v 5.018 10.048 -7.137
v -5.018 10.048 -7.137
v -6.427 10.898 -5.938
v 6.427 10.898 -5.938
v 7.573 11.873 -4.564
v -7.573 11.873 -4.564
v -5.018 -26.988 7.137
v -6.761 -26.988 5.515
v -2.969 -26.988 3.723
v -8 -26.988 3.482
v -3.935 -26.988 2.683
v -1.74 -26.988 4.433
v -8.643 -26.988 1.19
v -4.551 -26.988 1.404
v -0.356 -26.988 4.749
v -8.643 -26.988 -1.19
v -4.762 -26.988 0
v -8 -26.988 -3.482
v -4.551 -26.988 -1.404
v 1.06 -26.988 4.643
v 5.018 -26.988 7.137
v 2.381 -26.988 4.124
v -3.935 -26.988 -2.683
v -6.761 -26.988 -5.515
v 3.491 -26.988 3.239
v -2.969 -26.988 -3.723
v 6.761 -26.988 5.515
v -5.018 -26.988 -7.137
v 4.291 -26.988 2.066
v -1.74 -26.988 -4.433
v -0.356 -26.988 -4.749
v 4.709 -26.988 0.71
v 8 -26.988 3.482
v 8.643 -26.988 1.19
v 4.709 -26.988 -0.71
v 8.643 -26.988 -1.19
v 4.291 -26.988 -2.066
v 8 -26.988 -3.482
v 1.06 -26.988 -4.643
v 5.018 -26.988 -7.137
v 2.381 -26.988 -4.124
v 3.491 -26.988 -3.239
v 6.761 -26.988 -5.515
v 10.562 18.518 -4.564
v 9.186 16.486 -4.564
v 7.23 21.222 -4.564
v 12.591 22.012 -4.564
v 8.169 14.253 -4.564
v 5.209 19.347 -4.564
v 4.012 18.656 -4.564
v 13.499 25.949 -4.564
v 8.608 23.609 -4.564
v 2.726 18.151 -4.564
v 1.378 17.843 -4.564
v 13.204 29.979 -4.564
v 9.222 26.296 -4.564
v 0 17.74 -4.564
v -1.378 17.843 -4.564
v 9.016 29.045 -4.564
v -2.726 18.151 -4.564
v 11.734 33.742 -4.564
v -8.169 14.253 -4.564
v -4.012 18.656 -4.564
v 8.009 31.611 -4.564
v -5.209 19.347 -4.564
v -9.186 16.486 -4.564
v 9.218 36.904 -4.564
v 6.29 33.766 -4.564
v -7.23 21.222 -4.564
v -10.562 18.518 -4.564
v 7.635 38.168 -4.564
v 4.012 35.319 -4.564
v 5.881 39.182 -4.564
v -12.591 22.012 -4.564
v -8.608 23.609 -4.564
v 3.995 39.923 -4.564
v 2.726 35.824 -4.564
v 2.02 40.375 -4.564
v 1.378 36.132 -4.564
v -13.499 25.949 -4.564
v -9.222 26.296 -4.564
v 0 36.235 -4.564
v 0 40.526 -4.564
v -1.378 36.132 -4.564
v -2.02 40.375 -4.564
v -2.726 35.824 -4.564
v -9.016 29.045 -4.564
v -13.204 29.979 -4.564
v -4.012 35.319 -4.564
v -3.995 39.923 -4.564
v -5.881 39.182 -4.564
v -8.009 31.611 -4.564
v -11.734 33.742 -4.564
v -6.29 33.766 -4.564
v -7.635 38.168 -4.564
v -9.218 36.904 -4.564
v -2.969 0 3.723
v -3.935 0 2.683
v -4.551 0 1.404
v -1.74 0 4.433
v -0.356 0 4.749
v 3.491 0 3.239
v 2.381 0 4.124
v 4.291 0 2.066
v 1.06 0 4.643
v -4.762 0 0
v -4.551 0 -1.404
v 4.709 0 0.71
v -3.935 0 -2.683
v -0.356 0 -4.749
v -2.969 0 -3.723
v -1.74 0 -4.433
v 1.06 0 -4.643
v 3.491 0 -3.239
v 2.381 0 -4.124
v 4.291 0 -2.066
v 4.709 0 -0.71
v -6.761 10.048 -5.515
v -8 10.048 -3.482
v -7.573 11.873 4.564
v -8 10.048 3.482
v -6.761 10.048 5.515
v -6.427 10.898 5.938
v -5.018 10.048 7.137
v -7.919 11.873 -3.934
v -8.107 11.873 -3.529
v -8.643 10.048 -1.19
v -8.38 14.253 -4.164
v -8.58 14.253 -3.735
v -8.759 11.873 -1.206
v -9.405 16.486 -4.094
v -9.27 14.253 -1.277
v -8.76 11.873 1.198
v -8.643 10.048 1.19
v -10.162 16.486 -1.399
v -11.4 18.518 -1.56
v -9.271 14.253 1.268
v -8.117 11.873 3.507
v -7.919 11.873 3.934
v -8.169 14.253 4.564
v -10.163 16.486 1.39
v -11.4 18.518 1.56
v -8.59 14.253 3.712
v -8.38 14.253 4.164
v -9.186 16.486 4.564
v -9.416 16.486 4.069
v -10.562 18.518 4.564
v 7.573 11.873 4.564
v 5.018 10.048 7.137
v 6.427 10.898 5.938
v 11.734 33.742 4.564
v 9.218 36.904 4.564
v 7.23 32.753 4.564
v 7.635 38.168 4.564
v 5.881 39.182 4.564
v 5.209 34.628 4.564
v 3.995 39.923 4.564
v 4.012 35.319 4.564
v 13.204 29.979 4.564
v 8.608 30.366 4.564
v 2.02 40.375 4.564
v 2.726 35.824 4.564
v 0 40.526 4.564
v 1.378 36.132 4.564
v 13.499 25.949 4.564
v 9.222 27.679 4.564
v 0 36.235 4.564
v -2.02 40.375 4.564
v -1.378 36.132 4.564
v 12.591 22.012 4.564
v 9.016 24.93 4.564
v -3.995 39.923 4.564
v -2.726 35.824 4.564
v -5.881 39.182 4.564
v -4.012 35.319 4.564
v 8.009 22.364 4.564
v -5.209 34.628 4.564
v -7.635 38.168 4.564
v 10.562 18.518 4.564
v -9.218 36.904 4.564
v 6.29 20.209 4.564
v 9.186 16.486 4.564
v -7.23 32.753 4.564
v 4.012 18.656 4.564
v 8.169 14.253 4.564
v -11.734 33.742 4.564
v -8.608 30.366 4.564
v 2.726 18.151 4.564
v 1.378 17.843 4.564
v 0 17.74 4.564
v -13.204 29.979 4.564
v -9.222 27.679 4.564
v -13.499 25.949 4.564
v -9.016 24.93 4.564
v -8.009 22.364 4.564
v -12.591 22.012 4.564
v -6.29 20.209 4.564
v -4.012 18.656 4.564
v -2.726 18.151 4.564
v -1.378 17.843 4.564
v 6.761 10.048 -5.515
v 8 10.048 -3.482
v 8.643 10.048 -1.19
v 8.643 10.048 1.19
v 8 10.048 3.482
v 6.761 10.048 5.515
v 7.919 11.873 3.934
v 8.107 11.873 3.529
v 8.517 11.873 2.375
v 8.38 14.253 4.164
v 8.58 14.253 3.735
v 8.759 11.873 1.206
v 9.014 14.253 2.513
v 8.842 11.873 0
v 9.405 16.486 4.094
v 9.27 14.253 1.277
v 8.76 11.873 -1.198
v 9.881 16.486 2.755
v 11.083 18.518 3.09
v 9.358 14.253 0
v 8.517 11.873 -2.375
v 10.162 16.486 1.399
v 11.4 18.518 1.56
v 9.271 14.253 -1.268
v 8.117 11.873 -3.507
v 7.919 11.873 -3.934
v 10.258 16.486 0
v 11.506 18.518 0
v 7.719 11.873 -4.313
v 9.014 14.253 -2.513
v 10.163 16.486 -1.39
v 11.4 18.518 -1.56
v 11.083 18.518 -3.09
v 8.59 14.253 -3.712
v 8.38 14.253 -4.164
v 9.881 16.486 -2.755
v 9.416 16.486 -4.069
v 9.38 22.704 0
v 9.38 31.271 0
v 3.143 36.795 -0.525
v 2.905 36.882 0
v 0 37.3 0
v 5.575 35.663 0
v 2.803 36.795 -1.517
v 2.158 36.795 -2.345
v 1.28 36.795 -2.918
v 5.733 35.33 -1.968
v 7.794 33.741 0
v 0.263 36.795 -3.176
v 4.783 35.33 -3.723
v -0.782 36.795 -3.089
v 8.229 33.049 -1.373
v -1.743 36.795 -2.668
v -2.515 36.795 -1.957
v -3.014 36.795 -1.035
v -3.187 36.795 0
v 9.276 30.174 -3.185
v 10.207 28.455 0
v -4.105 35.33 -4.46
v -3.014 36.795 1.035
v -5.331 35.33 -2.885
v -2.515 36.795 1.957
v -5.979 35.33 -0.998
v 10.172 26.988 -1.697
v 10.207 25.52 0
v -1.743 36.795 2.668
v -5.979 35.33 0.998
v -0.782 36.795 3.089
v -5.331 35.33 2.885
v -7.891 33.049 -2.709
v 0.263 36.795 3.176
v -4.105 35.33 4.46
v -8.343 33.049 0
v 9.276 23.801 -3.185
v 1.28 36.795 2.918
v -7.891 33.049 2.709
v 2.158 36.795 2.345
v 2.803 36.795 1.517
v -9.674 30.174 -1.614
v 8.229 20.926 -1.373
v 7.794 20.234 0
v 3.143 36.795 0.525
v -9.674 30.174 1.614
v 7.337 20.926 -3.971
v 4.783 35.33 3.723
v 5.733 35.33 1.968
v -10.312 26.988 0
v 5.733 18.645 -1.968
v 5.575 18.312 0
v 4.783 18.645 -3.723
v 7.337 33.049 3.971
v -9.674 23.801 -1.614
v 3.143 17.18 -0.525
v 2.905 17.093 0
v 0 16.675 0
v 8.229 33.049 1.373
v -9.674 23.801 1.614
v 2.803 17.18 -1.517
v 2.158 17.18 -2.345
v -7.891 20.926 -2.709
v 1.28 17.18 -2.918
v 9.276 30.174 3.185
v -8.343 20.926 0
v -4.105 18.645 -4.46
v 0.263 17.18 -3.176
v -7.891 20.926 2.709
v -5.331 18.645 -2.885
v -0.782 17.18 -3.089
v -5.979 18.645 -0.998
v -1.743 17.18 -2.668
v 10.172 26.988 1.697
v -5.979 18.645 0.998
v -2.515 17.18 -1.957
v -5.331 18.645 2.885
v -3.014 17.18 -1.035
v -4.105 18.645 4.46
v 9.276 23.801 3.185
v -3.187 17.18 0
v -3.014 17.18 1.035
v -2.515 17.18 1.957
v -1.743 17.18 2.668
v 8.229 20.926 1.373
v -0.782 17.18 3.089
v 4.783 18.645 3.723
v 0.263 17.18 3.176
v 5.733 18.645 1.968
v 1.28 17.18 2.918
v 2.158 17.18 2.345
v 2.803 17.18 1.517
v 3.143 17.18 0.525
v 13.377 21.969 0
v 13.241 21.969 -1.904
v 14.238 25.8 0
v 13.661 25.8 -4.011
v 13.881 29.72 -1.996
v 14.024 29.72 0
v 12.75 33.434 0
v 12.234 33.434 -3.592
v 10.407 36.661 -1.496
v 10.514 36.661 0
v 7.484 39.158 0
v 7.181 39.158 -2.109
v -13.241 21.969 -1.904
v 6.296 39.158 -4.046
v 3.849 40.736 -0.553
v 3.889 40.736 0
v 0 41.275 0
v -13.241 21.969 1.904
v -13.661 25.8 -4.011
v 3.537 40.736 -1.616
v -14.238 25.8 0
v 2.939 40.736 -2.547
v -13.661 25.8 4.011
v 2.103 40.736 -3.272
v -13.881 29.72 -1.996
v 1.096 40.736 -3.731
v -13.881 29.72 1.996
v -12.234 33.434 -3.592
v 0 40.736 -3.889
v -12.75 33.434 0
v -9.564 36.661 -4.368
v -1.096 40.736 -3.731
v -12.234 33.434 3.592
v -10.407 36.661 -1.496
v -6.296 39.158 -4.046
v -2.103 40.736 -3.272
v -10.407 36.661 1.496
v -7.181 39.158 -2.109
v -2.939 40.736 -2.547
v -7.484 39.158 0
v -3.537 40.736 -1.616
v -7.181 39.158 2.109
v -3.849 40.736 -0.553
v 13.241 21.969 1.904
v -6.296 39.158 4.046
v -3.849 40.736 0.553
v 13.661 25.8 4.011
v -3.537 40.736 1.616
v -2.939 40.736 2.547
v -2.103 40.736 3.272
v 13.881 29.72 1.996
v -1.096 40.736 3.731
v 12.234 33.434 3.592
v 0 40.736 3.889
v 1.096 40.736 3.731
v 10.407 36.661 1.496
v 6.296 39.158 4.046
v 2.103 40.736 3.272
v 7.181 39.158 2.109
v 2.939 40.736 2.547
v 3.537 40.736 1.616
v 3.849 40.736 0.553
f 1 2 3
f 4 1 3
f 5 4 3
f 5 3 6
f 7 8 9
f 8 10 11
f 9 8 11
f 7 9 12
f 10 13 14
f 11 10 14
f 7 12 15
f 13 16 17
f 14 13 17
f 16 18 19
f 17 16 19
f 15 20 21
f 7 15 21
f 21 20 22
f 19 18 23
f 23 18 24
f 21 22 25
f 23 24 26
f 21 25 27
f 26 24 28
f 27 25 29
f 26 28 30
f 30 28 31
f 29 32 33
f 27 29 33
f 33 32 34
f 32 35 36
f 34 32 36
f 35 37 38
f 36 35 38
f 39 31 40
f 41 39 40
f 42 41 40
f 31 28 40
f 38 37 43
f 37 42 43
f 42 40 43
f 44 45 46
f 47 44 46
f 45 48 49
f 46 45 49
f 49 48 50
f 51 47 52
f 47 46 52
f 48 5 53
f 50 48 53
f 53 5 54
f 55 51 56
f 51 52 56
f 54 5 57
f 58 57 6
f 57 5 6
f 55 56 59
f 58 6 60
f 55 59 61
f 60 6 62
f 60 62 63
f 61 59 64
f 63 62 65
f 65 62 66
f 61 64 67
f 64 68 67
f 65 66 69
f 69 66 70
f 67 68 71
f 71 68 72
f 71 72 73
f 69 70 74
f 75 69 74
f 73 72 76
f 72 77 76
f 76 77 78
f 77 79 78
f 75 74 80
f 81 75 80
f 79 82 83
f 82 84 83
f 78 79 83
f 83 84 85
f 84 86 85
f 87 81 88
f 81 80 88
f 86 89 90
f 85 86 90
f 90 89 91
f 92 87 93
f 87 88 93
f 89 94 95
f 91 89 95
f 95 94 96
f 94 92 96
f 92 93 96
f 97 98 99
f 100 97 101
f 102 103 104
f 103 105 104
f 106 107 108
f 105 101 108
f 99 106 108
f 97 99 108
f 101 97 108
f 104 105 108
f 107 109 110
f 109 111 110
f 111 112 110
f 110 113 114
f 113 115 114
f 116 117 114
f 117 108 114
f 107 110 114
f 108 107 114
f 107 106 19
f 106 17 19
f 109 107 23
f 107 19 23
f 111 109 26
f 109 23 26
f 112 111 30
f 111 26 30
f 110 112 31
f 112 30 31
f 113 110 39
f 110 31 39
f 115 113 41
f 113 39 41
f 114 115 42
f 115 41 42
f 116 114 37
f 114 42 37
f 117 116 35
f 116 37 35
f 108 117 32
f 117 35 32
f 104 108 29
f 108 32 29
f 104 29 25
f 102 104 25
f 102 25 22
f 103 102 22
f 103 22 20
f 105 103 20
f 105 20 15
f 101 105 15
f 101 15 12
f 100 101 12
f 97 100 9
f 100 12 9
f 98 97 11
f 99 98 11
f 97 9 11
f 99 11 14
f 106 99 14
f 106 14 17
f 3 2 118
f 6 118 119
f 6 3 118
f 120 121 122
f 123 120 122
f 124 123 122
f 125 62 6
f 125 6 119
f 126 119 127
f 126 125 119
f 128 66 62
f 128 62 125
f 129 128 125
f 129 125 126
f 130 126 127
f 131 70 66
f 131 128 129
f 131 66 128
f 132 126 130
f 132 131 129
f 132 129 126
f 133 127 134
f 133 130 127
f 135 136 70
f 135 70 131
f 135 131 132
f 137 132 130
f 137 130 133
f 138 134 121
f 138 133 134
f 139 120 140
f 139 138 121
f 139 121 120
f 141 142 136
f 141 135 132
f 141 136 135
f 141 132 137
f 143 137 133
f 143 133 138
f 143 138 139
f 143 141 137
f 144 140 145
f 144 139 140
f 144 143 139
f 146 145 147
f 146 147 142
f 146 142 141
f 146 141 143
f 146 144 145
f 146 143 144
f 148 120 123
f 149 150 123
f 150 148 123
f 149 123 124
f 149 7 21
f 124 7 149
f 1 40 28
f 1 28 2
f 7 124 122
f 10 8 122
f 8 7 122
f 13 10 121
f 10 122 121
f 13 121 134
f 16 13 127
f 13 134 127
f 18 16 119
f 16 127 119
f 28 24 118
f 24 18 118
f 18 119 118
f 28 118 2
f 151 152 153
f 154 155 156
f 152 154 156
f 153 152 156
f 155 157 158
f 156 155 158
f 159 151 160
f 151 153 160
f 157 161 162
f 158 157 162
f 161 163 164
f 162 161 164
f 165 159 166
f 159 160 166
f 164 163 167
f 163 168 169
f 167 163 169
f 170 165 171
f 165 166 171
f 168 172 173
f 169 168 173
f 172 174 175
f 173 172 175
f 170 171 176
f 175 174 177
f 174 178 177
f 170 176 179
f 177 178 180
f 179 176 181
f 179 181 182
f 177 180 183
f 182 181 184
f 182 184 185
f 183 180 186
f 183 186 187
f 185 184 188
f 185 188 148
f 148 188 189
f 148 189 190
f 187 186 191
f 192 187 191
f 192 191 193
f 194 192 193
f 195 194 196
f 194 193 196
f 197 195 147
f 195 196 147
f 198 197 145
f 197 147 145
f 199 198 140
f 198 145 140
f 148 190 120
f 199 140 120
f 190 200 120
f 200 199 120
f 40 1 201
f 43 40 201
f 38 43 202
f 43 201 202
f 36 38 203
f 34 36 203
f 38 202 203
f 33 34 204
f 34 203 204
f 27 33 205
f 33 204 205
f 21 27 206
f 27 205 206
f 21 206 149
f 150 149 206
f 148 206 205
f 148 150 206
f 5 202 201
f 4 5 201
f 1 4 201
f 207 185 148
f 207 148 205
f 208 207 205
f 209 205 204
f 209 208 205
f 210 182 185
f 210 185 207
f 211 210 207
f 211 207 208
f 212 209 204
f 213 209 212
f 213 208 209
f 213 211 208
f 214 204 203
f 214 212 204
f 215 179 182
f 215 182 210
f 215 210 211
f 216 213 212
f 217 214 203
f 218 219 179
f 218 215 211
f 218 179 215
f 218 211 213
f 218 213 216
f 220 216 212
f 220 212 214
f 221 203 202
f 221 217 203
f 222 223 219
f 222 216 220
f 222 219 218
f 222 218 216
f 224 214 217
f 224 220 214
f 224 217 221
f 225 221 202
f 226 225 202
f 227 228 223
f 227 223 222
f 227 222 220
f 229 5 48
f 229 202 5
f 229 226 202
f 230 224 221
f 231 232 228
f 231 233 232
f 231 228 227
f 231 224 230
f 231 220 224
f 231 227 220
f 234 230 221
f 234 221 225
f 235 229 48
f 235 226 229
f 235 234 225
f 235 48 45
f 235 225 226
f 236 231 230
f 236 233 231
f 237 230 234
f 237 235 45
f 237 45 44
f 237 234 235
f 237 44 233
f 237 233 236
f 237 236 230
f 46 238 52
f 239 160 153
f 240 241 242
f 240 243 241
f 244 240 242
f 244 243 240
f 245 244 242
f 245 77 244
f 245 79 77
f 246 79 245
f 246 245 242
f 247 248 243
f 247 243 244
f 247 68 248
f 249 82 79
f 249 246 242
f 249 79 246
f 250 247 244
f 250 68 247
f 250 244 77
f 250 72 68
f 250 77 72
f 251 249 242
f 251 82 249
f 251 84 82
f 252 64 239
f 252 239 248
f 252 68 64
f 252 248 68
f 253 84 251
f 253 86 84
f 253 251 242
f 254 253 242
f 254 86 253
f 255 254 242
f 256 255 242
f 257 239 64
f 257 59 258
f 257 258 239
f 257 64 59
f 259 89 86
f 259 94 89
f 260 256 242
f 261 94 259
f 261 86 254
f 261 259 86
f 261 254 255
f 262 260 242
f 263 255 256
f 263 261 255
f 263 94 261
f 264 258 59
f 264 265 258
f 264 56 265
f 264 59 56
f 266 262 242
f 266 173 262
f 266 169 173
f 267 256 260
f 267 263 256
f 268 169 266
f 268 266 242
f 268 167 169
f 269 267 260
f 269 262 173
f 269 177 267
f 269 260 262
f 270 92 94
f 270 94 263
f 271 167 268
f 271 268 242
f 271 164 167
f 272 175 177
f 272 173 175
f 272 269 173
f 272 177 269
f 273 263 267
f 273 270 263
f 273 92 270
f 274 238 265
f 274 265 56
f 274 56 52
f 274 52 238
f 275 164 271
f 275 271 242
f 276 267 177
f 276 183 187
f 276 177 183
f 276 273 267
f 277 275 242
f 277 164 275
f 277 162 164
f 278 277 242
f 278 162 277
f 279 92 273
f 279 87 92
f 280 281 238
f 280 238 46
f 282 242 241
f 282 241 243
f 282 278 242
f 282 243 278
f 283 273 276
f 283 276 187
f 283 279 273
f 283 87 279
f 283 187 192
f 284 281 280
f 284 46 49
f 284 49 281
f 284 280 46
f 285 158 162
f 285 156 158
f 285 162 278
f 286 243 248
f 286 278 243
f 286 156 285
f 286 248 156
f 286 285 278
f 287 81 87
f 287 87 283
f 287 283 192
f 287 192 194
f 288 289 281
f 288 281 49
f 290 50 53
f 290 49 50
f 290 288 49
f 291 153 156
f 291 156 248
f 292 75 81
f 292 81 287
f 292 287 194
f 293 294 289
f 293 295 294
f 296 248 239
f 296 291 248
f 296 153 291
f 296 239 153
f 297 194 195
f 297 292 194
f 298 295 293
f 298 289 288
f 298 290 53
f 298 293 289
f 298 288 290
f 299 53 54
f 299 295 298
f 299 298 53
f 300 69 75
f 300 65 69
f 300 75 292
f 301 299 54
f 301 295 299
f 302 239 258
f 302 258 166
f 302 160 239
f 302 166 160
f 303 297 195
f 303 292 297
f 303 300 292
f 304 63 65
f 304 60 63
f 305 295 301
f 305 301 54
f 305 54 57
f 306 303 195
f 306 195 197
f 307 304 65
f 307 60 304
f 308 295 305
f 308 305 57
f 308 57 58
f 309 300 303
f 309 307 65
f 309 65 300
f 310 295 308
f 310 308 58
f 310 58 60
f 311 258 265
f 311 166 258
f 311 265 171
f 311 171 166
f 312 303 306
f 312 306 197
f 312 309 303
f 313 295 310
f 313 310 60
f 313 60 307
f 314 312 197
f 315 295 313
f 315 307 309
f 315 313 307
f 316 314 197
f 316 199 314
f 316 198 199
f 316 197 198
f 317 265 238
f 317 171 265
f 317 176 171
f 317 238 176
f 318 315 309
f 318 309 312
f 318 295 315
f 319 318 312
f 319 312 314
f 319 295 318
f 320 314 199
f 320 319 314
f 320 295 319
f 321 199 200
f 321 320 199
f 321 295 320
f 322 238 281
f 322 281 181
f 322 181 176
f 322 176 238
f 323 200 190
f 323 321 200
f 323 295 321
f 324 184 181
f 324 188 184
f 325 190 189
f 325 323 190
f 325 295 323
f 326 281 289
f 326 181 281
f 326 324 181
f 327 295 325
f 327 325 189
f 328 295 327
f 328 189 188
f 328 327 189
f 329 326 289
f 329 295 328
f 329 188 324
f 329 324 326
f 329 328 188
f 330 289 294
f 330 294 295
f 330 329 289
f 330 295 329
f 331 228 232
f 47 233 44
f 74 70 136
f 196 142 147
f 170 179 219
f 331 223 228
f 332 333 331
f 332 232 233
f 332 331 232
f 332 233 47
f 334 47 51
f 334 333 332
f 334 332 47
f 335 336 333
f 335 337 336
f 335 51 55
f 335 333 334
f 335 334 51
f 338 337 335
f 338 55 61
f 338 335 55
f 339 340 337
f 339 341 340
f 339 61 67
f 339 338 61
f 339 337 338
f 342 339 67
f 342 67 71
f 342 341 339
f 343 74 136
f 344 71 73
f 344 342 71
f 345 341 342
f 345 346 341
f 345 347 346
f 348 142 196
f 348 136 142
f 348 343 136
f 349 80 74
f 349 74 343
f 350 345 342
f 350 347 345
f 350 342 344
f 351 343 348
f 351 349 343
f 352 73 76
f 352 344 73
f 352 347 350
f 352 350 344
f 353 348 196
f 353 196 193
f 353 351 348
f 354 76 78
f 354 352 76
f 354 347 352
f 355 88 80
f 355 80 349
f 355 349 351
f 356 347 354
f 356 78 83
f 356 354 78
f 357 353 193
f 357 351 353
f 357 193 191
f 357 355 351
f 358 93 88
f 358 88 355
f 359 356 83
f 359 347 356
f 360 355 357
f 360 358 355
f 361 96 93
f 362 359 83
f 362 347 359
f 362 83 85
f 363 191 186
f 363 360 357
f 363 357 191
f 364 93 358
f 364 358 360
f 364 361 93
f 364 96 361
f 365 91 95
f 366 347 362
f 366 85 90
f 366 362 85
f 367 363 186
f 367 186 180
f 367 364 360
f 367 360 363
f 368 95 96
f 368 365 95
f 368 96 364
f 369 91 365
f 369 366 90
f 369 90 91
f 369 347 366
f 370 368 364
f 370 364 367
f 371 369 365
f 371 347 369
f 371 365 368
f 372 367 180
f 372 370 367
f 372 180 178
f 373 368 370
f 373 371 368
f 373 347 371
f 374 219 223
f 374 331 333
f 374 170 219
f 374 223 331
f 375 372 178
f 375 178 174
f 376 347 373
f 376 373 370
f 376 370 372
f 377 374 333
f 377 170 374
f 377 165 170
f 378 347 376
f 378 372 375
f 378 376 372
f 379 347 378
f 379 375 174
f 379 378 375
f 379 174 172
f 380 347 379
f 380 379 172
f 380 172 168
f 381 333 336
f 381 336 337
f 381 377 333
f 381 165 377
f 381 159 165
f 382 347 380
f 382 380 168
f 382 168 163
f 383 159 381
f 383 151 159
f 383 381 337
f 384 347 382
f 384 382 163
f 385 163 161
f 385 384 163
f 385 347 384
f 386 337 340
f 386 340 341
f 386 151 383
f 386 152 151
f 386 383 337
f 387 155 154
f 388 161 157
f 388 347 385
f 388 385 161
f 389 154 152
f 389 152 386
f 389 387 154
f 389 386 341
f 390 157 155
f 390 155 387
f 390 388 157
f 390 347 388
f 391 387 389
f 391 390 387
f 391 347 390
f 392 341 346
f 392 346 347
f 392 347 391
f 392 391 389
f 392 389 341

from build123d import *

# Parameters (mm, degrees)
SKETCH17_W              = 7.1501
SKETCH17_H              = 68.2625
EXTRUDE3_DEPTH          = 63.5
CUT_EXTRUDE1_DEPTH      = 45.878768644
CUT_EXTRUDE1_DEPTH_BACK = 45.878768644


with BuildPart() as part:
    # Sketch15 → Revolve4 (revolve)
    with BuildSketch(Plane.XY, mode=Mode.PRIVATE) as revolve4_sk:
        Polygon((4.7625, -26.9875), (8.7249, -26.9875), (8.7249, 10.047604155), (0, 10.047604155), (0, 0), (4.7625, 0), align=None)
    revolve(revolve4_sk.sketch.rotate(Axis((0, 41.275, 0), (0, -1, 0)), 180), axis=Axis((0, 41.275, 0), (0, -1, 0)))

    # Sketch4 → Revolve2 (revolve)
    with BuildSketch(Plane.XY):
        with BuildLine():
            Line((0, 16.6751), (0, 10.047604155))
            Line((0, 10.047604155), (8.7249, 10.047604155))
            ThreePointArc((8.7249, 10.047604155), (9.438021768, 14.505059918), (11.5062, 18.517552077))
            ThreePointArc((11.5062, 18.517552077), (12.750432094, 33.434137701), (0, 41.275))
            Line((0, 41.275), (0, 37.2999))
            ThreePointArc((0, 37.2999), (10.3124, 26.9875), (0, 16.6751))
        make_face()
    revolve(axis=Axis((0, 41.275, 0), (0, 1, 0)))

    # Sketch17 → Extrude3 (cut, symmetric)
    with BuildSketch(Plane(origin=(0, 0, 0), x_dir=(0, 0, -1), z_dir=(1, 0, 0))):
        with Locations((-10.71245, 7.14375)):
            Rectangle(SKETCH17_W, SKETCH17_H)
        with Locations((10.71245, 7.14375)):
            Rectangle(SKETCH17_W, SKETCH17_H)
    extrude(amount=EXTRUDE3_DEPTH, both=True, mode=Mode.SUBTRACT)

    # Sketch5 → Cut-Extrude1 (cut, two sides: drawn at the far end of the back side and taken through both)
    with BuildSketch(Plane(origin=(0, 0, 0), x_dir=(0, 0, -1), z_dir=(1, 0, 0)).offset(-CUT_EXTRUDE1_DEPTH_BACK)):
        Polygon((4.5640625, 41.275), (12.2174, 41.275), (12.2174, 10.047604155), (7.1374, 10.047604155), (4.5640625, 11.873229155), align=None)
        Polygon((-4.5640625, 41.275), (-4.5640625, 11.873229155), (-7.1374, 10.047604155), (-12.2174, 10.047604155), (-12.2174, 41.275), align=None)
    extrude(amount=CUT_EXTRUDE1_DEPTH + CUT_EXTRUDE1_DEPTH_BACK, mode=Mode.SUBTRACT)


solid = part.part
